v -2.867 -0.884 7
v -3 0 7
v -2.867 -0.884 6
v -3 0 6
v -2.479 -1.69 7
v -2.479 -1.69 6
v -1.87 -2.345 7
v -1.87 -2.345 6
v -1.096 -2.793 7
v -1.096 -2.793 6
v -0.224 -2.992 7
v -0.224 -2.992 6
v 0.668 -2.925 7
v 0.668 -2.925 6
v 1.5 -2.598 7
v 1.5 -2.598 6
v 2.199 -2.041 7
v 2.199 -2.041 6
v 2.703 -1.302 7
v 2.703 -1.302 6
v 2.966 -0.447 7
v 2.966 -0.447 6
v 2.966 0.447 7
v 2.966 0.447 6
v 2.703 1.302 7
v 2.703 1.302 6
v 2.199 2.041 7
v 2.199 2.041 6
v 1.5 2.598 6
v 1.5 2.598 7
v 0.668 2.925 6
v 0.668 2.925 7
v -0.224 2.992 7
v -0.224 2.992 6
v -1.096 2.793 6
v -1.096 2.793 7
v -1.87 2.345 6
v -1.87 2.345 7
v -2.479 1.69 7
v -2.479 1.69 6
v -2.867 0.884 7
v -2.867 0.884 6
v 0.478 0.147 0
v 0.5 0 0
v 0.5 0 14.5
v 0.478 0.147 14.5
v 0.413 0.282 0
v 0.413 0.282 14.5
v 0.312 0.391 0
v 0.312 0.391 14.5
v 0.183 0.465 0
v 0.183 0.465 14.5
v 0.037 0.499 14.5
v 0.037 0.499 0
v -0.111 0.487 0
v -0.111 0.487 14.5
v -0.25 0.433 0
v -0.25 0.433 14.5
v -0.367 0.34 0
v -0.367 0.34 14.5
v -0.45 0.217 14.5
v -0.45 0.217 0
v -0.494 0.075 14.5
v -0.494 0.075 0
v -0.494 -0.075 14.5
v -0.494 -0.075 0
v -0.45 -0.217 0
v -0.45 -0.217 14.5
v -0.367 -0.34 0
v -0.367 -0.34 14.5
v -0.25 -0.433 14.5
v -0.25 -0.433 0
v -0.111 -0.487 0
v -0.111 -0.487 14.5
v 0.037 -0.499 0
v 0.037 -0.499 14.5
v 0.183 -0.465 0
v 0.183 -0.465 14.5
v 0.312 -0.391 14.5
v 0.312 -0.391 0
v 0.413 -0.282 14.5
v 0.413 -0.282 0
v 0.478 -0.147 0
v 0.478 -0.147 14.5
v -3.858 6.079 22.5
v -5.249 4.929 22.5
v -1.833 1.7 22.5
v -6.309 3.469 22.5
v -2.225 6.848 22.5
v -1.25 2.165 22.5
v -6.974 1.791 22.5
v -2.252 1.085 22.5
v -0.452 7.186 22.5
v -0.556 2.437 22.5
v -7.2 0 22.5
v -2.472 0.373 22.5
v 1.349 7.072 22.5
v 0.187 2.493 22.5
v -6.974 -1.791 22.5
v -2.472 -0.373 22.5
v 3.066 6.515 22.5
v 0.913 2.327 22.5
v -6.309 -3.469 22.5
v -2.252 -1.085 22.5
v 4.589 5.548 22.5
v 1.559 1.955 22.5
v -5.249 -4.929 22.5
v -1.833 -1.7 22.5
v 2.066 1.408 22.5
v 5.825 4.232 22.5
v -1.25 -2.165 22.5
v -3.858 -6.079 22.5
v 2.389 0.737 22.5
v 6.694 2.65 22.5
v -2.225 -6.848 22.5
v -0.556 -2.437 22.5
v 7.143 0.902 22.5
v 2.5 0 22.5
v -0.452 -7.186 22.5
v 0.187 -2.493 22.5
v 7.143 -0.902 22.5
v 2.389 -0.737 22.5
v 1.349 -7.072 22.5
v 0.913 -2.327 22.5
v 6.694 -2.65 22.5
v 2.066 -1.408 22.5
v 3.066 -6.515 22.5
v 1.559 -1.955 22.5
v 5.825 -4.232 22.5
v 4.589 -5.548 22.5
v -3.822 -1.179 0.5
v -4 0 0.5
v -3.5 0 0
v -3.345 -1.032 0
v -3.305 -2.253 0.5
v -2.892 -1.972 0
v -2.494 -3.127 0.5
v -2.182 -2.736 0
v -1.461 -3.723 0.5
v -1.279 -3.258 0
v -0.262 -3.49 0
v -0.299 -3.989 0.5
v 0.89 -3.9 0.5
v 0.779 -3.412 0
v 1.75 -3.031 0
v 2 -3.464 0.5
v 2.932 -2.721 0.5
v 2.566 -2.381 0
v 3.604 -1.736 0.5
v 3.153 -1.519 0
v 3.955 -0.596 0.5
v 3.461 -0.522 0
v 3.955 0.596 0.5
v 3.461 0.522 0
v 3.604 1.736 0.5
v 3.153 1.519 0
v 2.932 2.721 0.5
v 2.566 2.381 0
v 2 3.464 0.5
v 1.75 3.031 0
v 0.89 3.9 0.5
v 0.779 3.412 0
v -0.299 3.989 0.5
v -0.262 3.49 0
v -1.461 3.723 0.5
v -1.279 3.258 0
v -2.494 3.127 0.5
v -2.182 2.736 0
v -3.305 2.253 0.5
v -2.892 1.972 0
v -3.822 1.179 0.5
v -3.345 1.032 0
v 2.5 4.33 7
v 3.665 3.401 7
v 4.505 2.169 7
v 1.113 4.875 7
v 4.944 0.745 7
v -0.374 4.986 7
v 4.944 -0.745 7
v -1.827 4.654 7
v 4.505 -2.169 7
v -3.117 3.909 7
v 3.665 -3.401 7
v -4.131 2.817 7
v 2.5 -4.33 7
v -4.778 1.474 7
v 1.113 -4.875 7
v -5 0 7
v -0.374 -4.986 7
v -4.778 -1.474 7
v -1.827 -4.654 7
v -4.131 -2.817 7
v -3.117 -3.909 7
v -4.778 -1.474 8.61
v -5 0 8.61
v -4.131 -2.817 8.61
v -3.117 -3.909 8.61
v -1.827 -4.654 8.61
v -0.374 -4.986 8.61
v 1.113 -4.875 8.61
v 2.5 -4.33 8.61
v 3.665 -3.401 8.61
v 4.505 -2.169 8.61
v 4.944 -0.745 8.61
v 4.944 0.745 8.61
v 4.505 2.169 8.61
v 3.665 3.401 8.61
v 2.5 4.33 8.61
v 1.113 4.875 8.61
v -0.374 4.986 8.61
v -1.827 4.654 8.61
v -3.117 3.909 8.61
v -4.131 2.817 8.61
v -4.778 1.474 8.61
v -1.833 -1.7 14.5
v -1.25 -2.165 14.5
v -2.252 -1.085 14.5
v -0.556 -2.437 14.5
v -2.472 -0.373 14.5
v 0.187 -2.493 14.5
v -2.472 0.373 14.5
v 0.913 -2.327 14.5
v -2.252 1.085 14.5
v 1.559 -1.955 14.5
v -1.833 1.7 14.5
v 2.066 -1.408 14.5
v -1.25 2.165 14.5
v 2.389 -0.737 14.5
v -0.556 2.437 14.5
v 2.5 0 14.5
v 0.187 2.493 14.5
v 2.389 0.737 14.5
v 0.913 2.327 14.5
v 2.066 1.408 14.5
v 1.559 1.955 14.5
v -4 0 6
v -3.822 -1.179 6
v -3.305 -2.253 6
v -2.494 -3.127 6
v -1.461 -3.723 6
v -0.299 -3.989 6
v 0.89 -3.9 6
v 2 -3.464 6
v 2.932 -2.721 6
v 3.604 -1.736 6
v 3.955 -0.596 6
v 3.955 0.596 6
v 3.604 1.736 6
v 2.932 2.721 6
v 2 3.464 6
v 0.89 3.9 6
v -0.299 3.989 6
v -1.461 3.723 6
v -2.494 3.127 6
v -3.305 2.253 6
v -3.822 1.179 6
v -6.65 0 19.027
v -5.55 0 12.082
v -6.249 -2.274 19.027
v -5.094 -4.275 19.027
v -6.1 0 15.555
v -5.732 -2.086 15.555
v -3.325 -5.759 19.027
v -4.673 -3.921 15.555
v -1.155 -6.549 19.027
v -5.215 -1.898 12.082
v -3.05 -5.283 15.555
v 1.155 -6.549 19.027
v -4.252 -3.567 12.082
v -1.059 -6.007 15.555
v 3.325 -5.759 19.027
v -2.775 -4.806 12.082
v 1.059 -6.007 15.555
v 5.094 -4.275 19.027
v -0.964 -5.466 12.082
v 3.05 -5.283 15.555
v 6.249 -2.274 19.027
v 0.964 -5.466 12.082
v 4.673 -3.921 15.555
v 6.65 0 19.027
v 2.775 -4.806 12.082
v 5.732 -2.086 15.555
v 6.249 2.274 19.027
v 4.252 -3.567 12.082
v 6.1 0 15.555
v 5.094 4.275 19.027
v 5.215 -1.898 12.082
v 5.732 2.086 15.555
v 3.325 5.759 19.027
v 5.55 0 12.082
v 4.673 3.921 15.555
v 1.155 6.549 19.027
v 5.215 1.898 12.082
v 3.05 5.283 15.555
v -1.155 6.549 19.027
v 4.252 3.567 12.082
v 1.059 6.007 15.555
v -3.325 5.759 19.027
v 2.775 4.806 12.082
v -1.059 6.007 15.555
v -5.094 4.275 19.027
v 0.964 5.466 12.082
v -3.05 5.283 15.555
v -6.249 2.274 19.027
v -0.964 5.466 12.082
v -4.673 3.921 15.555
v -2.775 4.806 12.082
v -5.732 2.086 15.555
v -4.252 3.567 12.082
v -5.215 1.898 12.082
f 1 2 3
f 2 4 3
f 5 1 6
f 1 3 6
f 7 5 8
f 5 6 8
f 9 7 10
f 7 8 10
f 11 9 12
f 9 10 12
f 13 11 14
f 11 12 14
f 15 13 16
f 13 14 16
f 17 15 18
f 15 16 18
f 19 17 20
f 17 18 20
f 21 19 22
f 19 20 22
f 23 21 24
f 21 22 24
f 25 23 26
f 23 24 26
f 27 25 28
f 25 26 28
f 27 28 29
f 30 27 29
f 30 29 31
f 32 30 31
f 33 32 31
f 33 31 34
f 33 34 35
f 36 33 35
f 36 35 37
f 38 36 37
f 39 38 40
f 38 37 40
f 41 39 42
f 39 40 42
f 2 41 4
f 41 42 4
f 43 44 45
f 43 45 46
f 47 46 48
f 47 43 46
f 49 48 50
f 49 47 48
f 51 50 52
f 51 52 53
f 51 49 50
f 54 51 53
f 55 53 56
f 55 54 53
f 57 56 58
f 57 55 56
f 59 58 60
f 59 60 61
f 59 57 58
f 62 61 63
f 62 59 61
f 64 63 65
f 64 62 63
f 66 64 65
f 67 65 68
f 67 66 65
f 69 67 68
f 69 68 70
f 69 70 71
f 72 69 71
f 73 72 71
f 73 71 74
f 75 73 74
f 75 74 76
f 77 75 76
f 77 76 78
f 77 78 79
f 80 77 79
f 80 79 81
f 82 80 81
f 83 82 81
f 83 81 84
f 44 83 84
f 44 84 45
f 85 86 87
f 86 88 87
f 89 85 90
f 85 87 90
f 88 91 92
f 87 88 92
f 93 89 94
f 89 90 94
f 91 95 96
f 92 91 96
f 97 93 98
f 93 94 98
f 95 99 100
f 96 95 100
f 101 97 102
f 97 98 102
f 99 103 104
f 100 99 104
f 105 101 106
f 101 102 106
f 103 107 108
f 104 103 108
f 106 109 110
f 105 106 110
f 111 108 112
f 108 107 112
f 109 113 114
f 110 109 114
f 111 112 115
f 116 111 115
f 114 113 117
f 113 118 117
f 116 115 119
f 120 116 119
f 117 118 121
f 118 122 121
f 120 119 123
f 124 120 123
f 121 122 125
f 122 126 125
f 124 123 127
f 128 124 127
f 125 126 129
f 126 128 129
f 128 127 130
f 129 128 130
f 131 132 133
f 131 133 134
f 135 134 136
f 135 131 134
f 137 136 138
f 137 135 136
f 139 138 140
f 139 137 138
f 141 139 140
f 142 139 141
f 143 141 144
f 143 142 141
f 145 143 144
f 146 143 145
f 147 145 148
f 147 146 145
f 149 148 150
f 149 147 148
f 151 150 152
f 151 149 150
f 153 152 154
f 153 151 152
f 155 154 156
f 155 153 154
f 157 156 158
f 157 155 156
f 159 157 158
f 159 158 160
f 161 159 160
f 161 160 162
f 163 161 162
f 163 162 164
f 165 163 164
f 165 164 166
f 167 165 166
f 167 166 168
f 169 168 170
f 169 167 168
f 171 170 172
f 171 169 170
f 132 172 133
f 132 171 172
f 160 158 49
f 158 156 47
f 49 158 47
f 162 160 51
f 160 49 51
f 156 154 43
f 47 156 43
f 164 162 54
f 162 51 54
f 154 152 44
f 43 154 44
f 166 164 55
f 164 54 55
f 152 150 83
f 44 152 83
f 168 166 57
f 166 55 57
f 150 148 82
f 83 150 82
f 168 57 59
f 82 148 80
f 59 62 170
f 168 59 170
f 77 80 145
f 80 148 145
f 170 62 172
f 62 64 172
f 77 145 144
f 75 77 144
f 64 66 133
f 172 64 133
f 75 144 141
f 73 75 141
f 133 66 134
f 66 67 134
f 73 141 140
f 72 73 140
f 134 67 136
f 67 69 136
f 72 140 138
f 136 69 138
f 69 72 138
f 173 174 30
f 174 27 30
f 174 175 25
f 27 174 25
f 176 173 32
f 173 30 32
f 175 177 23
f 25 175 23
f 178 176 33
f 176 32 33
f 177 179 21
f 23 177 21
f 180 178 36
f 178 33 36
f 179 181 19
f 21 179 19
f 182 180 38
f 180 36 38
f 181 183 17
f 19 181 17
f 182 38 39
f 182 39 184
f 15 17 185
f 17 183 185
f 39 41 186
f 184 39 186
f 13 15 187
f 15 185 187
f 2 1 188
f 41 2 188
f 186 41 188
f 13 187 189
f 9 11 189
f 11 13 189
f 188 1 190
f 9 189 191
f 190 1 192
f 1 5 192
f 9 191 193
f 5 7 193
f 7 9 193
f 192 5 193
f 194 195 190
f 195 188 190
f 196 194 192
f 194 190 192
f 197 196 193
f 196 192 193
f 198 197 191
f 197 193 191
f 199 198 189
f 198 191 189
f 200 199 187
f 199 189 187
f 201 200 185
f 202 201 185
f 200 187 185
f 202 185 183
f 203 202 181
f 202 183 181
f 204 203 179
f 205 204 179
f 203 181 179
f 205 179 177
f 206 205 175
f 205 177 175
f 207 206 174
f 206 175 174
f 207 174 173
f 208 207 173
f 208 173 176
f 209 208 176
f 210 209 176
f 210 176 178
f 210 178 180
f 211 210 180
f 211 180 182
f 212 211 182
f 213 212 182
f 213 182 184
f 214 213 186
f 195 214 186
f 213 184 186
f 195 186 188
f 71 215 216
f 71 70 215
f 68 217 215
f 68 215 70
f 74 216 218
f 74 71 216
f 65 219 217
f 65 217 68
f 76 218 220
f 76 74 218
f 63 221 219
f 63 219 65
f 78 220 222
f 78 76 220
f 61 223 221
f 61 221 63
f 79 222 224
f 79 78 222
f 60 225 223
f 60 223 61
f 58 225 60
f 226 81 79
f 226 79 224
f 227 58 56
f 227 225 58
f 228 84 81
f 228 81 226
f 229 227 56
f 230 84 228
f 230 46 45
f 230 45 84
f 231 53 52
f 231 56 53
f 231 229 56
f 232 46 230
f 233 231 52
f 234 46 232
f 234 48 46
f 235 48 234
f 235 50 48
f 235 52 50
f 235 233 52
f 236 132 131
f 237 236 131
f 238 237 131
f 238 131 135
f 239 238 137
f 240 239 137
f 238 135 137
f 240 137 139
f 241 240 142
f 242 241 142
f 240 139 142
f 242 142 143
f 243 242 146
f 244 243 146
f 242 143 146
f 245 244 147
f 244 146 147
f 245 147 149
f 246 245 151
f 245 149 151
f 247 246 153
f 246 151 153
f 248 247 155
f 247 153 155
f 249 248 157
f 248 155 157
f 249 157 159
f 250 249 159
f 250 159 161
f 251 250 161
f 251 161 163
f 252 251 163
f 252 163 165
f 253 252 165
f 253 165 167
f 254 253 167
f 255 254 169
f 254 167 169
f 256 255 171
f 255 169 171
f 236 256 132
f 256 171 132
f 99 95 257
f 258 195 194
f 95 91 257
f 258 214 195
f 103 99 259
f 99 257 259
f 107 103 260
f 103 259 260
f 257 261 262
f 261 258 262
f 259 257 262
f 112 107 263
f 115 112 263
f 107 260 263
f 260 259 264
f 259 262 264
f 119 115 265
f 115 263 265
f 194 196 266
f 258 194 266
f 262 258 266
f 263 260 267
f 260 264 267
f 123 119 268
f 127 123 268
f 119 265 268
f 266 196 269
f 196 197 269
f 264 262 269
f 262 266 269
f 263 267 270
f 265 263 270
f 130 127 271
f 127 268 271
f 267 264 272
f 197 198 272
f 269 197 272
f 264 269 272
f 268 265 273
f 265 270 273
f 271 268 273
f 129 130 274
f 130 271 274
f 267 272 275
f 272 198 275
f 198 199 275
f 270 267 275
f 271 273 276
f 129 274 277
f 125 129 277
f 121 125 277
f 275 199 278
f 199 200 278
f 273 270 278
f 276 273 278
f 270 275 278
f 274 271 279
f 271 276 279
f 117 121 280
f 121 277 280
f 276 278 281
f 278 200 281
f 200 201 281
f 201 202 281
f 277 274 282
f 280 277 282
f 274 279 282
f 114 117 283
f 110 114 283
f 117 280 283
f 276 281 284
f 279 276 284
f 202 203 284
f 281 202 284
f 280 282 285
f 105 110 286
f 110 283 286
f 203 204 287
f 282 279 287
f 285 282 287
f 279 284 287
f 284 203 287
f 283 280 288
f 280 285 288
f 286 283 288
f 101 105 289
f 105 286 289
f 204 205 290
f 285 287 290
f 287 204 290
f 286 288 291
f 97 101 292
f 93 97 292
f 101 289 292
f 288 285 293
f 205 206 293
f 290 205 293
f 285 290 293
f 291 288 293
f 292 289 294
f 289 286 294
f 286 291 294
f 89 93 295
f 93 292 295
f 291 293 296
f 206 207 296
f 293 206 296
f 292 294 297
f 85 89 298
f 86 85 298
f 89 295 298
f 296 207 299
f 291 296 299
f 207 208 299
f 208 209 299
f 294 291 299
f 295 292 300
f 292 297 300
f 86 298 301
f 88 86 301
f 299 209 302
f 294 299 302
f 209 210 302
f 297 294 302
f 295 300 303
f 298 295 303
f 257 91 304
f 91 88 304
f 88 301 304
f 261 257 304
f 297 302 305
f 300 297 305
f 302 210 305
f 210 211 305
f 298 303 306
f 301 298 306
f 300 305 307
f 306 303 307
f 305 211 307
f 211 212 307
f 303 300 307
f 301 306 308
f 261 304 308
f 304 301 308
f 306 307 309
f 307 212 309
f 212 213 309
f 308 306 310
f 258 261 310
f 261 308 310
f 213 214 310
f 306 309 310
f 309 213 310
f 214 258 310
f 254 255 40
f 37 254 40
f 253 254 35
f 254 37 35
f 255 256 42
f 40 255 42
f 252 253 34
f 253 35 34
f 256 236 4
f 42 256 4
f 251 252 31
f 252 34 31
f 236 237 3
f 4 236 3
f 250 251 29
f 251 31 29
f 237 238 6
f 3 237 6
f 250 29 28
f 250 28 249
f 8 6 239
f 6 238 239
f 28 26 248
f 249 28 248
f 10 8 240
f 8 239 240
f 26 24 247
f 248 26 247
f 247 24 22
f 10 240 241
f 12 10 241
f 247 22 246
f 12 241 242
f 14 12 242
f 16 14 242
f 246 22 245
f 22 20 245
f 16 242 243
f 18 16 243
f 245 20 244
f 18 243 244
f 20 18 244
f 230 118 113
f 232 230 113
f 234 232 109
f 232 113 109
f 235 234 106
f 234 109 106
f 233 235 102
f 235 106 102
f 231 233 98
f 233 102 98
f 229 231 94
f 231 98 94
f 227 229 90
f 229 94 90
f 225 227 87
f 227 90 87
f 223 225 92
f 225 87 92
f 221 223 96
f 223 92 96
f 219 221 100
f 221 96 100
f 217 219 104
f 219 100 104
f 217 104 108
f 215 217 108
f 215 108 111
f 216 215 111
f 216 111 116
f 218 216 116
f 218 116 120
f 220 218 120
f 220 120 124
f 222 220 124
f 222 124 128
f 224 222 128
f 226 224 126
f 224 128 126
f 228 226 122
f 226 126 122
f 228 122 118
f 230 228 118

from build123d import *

# Parameters (mm, degrees)
F2_R     = 0.5
F3_DEPTH = 25
F4_R     = 2.5
F4_R_2   = 0.5
F5_DEPTH = 8
F6_SIZE  = 0.5


with BuildPart() as f1:
    # F0 (on Front) → F1 (revolve)
    with BuildSketch(Plane.XZ):
        Polygon((0, 0), (0, 22.5), (-7.2, 22.5), (-5, 8.609747), (-5, 7), (-3, 7), (-3, 6), (-4, 6), (-4, 0), align=None)
    revolve(axis=Axis((0, 0, 11.25), (0, 0, 1)))

    # F2 (on Top) → F3 (cut)
    with BuildSketch(Plane.XY):
        Circle(F2_R)
    extrude(amount=F3_DEPTH, mode=Mode.SUBTRACT)

    # F4 (on face) → F5 (cut)
    with BuildSketch(Plane.XY.offset(22.5)):
        Circle(F4_R)
        Circle(F4_R_2, mode=Mode.SUBTRACT)
    extrude(amount=-F5_DEPTH, mode=Mode.SUBTRACT)

    # F6
    f6_edges = [f1.edges().sort_by_distance(p)[0] for p in [
        (4, 0, 0),
    ]]
    chamfer(f6_edges, length=F6_SIZE)


solid = f1.part
